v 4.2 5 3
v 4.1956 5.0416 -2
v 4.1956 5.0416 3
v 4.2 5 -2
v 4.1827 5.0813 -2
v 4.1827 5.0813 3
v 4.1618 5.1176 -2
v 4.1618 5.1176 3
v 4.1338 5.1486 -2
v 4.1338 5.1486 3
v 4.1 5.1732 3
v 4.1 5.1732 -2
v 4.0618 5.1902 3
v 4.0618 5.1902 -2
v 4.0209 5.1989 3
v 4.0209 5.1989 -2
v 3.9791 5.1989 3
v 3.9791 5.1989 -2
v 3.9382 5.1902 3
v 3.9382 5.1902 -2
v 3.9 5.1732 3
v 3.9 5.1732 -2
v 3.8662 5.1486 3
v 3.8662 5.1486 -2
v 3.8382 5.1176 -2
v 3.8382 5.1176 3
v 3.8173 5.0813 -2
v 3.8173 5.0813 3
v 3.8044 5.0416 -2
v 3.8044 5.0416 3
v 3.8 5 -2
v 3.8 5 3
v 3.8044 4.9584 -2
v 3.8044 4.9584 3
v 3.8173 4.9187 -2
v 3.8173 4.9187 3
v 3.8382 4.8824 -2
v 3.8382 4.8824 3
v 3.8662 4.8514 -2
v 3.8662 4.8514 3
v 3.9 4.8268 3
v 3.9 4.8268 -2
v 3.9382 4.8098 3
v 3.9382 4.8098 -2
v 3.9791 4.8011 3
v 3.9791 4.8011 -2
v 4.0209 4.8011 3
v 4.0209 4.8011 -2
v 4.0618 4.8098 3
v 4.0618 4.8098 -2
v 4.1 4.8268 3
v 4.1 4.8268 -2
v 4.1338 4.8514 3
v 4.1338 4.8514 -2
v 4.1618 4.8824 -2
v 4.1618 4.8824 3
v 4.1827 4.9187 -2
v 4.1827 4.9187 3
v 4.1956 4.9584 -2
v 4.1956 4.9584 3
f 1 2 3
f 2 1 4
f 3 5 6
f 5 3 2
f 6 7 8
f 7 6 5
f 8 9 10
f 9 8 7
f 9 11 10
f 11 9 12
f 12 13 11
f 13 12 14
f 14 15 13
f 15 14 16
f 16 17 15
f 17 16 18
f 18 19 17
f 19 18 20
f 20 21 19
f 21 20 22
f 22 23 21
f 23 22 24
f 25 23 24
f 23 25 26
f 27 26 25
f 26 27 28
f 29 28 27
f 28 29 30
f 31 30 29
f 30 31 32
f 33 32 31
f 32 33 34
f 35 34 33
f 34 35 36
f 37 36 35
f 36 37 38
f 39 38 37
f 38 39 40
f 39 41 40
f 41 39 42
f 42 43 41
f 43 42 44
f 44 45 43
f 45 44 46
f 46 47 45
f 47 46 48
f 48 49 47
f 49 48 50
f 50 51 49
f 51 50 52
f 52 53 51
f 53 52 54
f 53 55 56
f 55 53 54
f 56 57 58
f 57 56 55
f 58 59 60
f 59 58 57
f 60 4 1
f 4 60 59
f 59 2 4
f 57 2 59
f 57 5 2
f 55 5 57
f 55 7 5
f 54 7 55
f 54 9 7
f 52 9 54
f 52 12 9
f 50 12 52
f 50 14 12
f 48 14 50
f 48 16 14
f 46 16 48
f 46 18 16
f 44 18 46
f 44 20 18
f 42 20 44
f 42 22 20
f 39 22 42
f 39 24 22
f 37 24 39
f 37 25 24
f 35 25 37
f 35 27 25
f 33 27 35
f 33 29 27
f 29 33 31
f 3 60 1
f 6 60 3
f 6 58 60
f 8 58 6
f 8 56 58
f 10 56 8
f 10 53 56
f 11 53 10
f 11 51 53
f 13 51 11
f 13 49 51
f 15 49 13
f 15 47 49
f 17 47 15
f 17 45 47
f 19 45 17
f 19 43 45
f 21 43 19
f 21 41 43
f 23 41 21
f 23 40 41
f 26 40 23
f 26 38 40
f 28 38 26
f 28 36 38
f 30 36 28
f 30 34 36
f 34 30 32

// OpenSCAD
$fs = 0.01;

module draw_pad(
    pos, // center point as 2-vector
    diameter, // diameter of hole, as number
    z_bounds, // top and bottom z, as 2-vector
) {
    translate([pos.x, pos.y, min(z_bounds)])
    cylinder(
        abs(z_bounds[1] - z_bounds[0]),
        d = diameter,
        center = false
    );
}

draw_pad([4, 5], 0.4, [-2, 3]);
